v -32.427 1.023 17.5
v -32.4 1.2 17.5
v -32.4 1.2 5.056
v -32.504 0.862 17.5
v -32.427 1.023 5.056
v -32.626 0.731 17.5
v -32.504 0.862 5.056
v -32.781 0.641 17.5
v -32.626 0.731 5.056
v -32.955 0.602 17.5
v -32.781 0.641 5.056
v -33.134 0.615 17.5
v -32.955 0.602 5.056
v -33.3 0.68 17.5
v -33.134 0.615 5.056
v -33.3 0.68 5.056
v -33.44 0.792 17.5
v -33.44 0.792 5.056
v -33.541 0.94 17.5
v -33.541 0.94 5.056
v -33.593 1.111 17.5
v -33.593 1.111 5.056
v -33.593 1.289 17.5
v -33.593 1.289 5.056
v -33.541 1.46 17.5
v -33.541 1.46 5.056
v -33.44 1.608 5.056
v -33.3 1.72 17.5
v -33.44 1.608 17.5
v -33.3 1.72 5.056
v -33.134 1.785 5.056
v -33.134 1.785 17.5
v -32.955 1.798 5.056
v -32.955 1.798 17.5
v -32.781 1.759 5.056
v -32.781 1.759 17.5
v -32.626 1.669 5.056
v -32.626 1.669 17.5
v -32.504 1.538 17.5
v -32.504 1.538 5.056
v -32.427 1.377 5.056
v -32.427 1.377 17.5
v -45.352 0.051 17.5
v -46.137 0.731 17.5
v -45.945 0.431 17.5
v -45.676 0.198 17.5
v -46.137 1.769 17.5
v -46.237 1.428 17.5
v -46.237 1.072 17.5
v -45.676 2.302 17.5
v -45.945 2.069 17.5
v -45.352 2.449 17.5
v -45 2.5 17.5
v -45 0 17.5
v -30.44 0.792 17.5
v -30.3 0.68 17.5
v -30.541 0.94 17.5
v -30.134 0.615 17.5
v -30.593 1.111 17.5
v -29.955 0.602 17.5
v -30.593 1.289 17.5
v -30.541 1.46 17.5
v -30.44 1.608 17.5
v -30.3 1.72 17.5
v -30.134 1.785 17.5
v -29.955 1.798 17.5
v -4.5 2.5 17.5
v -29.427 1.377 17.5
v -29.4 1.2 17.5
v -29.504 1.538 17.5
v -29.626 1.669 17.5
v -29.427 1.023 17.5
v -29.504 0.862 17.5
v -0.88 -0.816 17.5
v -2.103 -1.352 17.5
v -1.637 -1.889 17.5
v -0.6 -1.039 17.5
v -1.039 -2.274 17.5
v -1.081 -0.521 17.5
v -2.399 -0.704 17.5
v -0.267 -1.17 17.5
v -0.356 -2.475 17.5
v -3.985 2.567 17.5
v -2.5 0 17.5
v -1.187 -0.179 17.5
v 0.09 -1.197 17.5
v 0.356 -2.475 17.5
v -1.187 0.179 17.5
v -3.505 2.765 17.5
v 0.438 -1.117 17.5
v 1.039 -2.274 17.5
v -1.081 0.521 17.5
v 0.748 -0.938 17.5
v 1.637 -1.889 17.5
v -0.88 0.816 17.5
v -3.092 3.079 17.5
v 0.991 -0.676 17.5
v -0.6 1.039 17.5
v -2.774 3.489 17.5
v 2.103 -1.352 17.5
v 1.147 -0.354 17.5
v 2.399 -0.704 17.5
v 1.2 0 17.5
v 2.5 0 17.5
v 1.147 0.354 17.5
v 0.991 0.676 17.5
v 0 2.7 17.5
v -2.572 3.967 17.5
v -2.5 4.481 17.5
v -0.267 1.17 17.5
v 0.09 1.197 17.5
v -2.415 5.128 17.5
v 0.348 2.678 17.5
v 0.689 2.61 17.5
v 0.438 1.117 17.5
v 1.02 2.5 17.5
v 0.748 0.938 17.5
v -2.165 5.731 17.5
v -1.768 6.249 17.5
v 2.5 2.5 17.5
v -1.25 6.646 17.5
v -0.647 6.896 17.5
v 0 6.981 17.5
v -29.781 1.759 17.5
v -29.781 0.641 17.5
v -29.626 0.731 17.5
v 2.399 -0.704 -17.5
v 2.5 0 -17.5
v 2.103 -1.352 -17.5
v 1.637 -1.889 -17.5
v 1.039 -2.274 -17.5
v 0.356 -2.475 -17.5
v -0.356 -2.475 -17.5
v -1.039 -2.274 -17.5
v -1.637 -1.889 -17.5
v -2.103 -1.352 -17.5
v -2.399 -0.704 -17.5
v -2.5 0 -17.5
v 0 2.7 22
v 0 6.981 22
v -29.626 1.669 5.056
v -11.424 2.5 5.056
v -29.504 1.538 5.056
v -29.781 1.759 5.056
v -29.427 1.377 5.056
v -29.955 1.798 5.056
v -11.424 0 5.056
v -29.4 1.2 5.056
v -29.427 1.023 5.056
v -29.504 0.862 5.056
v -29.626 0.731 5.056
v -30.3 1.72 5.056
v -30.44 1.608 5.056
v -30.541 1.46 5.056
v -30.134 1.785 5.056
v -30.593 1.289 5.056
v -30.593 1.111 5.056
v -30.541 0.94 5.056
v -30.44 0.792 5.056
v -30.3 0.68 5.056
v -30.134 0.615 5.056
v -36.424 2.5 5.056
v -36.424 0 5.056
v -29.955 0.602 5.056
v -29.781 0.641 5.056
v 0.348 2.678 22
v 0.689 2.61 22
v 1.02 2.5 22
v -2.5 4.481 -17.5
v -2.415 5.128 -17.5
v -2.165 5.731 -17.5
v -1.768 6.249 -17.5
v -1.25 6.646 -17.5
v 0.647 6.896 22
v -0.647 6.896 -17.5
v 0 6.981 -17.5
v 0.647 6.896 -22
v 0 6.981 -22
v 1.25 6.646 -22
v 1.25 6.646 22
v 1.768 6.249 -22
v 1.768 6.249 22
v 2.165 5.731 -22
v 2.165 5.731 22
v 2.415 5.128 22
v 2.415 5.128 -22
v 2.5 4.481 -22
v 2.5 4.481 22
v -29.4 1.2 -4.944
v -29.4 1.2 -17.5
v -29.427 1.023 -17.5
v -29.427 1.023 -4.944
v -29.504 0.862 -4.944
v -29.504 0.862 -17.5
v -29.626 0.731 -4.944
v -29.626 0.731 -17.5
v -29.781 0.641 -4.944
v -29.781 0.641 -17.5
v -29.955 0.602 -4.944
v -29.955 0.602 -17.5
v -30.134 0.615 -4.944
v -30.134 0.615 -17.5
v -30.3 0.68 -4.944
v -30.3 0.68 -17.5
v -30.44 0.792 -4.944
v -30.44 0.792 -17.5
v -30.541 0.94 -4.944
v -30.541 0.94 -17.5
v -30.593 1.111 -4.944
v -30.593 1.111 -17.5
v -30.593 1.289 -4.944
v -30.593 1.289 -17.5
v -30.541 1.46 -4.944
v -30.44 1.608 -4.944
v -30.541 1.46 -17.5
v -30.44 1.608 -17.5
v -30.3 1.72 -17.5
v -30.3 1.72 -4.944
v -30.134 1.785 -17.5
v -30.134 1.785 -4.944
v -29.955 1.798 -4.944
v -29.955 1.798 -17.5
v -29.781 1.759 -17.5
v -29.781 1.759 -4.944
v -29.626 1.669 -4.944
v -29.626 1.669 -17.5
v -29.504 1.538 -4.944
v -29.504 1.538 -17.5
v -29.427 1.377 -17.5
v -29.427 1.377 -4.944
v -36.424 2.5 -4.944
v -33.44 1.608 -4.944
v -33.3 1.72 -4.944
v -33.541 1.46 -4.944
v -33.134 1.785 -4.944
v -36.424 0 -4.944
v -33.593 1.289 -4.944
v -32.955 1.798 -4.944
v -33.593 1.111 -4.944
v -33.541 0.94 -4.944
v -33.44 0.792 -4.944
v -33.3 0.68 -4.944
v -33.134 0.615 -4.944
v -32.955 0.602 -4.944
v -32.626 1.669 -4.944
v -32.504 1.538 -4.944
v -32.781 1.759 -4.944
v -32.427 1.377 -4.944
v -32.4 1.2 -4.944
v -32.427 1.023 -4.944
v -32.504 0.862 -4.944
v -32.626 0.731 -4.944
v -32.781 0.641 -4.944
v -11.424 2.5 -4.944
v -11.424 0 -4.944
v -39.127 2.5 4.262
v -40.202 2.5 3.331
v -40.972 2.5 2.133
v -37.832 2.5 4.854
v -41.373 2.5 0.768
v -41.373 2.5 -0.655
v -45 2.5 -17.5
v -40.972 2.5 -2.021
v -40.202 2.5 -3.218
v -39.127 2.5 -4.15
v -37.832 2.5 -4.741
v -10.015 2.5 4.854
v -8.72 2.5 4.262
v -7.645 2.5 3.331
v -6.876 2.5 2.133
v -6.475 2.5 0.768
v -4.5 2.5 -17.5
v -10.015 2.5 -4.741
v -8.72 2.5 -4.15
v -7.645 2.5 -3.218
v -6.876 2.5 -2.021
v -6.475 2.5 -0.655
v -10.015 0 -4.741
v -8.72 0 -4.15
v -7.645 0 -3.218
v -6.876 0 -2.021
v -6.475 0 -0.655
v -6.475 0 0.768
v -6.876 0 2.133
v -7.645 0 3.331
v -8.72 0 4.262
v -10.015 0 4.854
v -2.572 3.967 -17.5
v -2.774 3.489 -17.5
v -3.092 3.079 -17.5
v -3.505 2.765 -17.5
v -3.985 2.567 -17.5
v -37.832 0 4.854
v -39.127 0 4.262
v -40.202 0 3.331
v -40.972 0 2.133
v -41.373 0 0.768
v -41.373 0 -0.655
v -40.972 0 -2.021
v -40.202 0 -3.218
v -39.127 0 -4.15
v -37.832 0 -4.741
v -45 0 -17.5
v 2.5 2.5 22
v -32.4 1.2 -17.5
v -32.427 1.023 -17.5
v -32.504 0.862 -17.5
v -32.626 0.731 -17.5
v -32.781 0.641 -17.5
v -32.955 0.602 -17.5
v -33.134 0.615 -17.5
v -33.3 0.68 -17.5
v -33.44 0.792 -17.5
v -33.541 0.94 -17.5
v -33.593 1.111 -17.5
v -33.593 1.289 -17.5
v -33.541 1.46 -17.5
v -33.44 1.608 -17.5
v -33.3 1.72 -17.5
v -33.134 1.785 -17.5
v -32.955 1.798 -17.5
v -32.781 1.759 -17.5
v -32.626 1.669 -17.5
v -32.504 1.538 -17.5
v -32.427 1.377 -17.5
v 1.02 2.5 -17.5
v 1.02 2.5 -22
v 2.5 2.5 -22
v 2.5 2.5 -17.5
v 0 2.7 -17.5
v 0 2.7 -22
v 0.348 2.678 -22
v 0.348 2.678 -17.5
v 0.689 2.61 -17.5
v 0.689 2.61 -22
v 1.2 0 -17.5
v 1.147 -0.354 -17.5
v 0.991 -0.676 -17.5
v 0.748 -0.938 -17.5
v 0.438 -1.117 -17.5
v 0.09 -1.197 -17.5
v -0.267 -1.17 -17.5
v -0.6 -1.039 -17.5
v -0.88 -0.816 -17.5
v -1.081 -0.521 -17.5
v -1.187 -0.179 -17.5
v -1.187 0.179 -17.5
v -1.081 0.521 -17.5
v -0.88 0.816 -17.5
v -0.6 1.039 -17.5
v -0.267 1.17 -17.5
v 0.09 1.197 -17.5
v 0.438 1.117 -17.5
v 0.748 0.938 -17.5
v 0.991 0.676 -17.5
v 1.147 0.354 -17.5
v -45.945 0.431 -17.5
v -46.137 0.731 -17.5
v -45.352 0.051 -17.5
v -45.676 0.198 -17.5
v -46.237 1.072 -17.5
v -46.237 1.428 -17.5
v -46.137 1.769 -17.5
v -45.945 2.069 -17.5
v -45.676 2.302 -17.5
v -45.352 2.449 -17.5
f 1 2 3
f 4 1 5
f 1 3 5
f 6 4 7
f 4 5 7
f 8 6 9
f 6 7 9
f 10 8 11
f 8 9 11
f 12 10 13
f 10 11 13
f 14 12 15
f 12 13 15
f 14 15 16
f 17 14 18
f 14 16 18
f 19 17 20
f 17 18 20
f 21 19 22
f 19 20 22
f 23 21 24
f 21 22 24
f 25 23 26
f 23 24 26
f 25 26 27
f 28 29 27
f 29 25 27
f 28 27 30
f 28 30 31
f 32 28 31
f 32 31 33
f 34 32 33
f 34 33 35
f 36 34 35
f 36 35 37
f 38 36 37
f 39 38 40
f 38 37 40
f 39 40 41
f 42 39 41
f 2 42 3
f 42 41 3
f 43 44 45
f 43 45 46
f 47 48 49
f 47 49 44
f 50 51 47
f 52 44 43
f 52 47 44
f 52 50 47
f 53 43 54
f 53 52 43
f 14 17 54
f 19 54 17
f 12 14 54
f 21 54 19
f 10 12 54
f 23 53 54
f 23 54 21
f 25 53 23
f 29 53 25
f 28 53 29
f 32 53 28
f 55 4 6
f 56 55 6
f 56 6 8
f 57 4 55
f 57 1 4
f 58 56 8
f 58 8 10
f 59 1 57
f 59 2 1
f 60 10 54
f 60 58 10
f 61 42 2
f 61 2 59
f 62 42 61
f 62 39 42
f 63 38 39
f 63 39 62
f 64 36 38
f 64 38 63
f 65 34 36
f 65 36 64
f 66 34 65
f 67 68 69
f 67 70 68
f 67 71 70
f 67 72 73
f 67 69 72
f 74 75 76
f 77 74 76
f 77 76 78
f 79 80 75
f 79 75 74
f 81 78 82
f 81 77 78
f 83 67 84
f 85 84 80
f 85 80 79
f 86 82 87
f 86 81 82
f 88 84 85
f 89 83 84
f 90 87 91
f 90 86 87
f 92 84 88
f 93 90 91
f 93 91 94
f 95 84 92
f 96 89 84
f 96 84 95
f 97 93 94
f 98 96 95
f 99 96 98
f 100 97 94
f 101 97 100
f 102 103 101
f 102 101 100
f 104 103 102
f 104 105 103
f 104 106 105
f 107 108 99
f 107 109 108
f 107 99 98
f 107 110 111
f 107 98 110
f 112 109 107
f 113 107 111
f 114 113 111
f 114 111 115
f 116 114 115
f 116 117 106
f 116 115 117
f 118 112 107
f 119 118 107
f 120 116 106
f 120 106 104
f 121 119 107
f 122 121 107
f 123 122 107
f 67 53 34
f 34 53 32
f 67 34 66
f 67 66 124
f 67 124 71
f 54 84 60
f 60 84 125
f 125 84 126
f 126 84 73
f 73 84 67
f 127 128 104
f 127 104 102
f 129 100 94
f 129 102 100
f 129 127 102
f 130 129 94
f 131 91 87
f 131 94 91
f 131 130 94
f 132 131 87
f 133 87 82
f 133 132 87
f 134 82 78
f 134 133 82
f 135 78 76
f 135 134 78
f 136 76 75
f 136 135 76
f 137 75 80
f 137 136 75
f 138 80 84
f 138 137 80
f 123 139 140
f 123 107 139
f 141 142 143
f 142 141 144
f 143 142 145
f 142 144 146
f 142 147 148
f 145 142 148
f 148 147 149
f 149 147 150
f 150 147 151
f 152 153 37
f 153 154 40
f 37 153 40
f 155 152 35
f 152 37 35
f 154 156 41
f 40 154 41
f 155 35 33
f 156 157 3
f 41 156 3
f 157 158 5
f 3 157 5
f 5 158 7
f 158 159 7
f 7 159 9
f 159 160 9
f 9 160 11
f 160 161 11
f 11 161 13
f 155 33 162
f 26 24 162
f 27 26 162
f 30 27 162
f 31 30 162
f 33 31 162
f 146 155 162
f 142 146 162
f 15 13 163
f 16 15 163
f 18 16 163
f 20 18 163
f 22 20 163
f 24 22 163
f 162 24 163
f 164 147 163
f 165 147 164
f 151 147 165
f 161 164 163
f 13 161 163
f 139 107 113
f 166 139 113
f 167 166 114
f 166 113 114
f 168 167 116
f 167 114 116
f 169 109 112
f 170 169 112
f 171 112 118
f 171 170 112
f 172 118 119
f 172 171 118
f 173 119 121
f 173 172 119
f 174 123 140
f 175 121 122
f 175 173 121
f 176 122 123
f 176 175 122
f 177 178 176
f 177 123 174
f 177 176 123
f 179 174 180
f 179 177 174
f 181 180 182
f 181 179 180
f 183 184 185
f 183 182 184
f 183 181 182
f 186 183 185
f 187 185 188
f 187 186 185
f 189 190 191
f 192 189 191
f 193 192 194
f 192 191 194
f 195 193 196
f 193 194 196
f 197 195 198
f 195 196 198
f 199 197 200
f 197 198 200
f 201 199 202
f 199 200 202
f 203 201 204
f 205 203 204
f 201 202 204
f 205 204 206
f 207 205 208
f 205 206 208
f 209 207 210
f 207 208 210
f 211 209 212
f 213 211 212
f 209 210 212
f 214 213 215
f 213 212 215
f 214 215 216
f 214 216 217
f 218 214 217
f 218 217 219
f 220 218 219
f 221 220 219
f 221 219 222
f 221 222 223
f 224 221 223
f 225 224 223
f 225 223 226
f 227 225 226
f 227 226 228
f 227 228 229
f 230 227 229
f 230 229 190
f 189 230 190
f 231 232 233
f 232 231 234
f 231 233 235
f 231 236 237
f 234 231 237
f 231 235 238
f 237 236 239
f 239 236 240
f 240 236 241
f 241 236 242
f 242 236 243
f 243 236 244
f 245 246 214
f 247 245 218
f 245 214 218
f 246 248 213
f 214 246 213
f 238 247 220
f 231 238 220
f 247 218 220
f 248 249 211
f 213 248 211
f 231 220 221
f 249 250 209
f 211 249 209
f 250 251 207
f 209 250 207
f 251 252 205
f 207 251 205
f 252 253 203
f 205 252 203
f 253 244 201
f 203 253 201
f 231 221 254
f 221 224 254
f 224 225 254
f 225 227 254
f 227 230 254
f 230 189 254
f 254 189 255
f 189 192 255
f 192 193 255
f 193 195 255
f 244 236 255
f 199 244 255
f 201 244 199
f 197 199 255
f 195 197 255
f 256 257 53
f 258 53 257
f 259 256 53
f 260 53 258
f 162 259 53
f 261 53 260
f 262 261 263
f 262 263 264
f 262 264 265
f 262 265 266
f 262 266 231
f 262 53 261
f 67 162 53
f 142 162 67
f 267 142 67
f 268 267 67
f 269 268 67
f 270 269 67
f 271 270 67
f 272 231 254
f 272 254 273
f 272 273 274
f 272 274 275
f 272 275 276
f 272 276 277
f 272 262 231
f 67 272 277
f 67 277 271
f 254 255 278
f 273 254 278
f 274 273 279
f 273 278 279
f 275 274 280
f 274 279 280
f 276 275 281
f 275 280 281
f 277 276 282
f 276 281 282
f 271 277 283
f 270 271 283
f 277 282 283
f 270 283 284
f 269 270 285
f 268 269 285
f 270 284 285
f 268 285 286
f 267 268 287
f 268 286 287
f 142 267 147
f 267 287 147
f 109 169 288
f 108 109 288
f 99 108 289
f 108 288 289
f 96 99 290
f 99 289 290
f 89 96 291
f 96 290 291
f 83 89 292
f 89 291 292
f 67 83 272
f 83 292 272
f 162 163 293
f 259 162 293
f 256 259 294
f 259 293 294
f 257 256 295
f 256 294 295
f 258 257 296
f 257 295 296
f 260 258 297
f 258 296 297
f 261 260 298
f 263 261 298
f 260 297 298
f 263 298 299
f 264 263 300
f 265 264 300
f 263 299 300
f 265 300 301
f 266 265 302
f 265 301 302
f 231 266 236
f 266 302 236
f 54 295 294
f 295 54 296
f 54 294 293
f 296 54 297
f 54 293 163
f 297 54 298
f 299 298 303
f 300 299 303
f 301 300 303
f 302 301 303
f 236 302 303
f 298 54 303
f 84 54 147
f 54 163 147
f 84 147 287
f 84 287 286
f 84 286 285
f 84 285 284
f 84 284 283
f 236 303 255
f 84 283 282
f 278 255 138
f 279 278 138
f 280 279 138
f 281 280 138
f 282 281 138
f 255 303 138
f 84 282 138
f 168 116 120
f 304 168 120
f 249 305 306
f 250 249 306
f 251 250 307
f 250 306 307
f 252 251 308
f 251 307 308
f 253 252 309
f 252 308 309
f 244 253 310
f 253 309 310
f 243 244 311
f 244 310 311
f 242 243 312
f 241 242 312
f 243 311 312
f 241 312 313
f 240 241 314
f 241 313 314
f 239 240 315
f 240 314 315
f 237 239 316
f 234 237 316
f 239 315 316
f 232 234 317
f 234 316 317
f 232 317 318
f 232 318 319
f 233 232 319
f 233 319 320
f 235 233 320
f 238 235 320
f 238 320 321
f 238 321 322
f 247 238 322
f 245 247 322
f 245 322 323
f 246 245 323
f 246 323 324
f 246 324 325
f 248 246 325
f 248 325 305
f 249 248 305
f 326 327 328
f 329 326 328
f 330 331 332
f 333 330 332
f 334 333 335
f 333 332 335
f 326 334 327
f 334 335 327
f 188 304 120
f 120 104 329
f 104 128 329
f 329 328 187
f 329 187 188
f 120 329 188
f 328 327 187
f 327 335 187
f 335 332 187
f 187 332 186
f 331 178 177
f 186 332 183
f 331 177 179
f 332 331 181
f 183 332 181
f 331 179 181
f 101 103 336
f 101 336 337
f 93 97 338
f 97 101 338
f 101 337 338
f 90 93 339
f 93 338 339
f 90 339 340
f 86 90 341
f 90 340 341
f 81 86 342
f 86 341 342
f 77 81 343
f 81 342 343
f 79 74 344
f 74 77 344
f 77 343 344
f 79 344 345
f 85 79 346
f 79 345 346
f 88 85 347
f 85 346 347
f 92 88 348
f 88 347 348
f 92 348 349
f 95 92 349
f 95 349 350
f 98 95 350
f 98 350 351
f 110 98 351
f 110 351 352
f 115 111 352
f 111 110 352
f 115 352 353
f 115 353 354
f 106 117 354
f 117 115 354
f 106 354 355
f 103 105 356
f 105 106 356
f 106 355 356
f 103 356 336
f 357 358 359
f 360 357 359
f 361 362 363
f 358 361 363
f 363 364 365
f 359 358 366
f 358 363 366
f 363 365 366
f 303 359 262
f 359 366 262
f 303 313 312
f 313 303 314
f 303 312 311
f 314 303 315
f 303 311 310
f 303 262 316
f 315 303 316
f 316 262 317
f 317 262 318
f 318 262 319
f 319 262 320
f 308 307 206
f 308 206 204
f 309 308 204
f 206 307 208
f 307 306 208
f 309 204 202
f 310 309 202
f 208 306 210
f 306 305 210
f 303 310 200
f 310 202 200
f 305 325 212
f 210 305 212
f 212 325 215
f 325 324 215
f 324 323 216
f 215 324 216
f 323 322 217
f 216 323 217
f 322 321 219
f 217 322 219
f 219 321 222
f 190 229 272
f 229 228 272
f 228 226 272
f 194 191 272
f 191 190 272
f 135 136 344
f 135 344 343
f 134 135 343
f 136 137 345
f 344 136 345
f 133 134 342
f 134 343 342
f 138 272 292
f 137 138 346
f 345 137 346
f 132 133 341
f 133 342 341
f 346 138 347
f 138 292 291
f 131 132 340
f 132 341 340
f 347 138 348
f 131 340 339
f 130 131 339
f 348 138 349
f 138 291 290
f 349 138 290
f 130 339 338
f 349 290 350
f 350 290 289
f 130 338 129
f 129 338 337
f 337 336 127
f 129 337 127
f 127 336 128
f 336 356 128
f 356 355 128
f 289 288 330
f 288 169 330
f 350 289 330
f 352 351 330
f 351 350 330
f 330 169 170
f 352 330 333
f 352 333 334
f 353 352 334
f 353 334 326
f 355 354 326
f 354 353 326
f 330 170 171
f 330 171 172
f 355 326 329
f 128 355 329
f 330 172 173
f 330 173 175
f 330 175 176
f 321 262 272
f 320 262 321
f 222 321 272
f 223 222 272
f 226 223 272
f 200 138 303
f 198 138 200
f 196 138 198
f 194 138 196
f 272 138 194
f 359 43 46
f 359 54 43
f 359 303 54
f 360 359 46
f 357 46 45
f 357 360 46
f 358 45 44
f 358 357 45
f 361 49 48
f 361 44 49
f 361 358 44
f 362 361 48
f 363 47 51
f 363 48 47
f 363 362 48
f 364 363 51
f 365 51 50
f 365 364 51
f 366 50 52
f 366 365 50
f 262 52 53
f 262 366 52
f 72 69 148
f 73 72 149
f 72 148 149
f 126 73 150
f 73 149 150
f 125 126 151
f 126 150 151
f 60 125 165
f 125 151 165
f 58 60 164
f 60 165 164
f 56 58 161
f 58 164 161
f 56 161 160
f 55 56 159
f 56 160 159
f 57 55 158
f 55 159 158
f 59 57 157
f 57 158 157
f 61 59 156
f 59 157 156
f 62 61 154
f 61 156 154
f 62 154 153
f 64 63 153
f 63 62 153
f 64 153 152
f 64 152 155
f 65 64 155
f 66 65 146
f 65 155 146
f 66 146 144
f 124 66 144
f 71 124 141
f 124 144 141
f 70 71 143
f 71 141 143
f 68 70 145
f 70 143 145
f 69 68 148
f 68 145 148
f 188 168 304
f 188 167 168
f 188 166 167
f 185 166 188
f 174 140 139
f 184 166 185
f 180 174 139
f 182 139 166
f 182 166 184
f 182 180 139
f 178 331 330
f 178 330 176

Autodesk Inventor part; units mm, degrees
ref_plane "YZ Plane" through (0, 0, 0) normal (1, 0, 0) x (0, 1, 0)
ref_plane "XZ Plane" through (0, 0, 0) normal (0, 1, 0) x (-1, 0, 0)
ref_plane "XY Plane" through (0, 0, 0) normal (0, 0, 1) x (1, 0, 0)
sketch "Skizze1" plane through (0, 0, 0) normal (0, 0, 1) x (1, 0, 0)
  line L0 (0, 9.4989) -> (0, -4.4998) construction
  line L1 (-56.1636, 0) -> (12.8813, 0) construction
  circle A0 centre (0, 0) radius 2.5
  arc A1 (-45, 2.5) -> (-45, 0) centre (-45, 1.25) ccw
  line L2 (-45, 2.5) -> (-4.5, 2.5)
  line L3 (-45, 0) -> (-2.5, 0)
  circle A2 centre (0, 0) radius 1.2
  circle A3 centre (-45, 1.2) radius 1.3
  line L4 (0, 2.5) -> (0, 6.9813)
  arc A4 (2.5, 4.4813) -> (0, 6.9813) centre (0, 4.4813) ccw
  line L5 (2.5, 2.5) -> (2.5, 0)
  line L6 (1.0198, 2.5) -> (2.5, 2.5)
  line L7 (2.5, 2.5) -> (2.5, 4.4813)
  arc A5 (0, 6.9813) -> (-2.5, 4.4813) centre (0, 4.4813) ccw
  line L8 (-2.5, 4.4813) -> (-2.5, 4.5)
  arc A6 (-4.5, 2.5) -> (-2.5, 4.5) centre (-4.5, 4.5) ccw
  arc A7 (1.0198, 2.5) -> (0, 2.7) centre (0, 0) ccw
  circle A8 centre (-33, 1.2) radius 0.6
  circle A9 centre (-30, 1.2) radius 0.6
  line L9 (-45, 1.2) -> (0, 1.2) construction
  point P0 (-2.5, 0)
  dimension "d3" = 2.4
  dimension "d0" = 5
  dimension "d1" = 2.5
  dimension "d6" = 45
  dimension "d21" = 2
  dimension "d22" = 0.2
  dimension "d23" = 1.2
  dimension "d24" = 3
  dimension "d25" = 30
extrude "Extrusion1" add sketch "Skizze1" along normal mid plane 35 contours A0 | A0 L4 A7 L6 L5 | A0 L3 A3 L2 A6 A5 L4 | L3 A1 A3 picked at (-45.3896, 1.1022)
extrude "Extrusion6" add sketch "Skizze1" along normal mid plane 44 contours L6 A7 L4 A4 L7
sketch "Skizze2" plane through (-45, 0, 17.5) normal (0, -1, 0) x (1, 0, 0)
  line L0 (8.5763, -17.4438) -> (33.5763, -17.4438) construction
  line L1 (8.5763, -22.4438) -> (33.5763, -22.4438)
  line L2 (33.5763, -12.4438) -> (8.5763, -12.4438)
  arc A0 (8.5763, -12.4438) -> (8.5763, -22.4438) centre (8.5763, -17.4438) ccw
  arc A1 (33.5763, -22.4438) -> (33.5763, -12.4438) centre (33.5763, -17.4438) ccw
  point P0 (45, -17.5)
  point P1 (21.0763, -17.4438)
  dimension "d26" = 10
  dimension "d27" = 25
extrude "Extrusion7" cut sketch "Skizze2" against normal through all
properties part number "Bottom-Lip"
